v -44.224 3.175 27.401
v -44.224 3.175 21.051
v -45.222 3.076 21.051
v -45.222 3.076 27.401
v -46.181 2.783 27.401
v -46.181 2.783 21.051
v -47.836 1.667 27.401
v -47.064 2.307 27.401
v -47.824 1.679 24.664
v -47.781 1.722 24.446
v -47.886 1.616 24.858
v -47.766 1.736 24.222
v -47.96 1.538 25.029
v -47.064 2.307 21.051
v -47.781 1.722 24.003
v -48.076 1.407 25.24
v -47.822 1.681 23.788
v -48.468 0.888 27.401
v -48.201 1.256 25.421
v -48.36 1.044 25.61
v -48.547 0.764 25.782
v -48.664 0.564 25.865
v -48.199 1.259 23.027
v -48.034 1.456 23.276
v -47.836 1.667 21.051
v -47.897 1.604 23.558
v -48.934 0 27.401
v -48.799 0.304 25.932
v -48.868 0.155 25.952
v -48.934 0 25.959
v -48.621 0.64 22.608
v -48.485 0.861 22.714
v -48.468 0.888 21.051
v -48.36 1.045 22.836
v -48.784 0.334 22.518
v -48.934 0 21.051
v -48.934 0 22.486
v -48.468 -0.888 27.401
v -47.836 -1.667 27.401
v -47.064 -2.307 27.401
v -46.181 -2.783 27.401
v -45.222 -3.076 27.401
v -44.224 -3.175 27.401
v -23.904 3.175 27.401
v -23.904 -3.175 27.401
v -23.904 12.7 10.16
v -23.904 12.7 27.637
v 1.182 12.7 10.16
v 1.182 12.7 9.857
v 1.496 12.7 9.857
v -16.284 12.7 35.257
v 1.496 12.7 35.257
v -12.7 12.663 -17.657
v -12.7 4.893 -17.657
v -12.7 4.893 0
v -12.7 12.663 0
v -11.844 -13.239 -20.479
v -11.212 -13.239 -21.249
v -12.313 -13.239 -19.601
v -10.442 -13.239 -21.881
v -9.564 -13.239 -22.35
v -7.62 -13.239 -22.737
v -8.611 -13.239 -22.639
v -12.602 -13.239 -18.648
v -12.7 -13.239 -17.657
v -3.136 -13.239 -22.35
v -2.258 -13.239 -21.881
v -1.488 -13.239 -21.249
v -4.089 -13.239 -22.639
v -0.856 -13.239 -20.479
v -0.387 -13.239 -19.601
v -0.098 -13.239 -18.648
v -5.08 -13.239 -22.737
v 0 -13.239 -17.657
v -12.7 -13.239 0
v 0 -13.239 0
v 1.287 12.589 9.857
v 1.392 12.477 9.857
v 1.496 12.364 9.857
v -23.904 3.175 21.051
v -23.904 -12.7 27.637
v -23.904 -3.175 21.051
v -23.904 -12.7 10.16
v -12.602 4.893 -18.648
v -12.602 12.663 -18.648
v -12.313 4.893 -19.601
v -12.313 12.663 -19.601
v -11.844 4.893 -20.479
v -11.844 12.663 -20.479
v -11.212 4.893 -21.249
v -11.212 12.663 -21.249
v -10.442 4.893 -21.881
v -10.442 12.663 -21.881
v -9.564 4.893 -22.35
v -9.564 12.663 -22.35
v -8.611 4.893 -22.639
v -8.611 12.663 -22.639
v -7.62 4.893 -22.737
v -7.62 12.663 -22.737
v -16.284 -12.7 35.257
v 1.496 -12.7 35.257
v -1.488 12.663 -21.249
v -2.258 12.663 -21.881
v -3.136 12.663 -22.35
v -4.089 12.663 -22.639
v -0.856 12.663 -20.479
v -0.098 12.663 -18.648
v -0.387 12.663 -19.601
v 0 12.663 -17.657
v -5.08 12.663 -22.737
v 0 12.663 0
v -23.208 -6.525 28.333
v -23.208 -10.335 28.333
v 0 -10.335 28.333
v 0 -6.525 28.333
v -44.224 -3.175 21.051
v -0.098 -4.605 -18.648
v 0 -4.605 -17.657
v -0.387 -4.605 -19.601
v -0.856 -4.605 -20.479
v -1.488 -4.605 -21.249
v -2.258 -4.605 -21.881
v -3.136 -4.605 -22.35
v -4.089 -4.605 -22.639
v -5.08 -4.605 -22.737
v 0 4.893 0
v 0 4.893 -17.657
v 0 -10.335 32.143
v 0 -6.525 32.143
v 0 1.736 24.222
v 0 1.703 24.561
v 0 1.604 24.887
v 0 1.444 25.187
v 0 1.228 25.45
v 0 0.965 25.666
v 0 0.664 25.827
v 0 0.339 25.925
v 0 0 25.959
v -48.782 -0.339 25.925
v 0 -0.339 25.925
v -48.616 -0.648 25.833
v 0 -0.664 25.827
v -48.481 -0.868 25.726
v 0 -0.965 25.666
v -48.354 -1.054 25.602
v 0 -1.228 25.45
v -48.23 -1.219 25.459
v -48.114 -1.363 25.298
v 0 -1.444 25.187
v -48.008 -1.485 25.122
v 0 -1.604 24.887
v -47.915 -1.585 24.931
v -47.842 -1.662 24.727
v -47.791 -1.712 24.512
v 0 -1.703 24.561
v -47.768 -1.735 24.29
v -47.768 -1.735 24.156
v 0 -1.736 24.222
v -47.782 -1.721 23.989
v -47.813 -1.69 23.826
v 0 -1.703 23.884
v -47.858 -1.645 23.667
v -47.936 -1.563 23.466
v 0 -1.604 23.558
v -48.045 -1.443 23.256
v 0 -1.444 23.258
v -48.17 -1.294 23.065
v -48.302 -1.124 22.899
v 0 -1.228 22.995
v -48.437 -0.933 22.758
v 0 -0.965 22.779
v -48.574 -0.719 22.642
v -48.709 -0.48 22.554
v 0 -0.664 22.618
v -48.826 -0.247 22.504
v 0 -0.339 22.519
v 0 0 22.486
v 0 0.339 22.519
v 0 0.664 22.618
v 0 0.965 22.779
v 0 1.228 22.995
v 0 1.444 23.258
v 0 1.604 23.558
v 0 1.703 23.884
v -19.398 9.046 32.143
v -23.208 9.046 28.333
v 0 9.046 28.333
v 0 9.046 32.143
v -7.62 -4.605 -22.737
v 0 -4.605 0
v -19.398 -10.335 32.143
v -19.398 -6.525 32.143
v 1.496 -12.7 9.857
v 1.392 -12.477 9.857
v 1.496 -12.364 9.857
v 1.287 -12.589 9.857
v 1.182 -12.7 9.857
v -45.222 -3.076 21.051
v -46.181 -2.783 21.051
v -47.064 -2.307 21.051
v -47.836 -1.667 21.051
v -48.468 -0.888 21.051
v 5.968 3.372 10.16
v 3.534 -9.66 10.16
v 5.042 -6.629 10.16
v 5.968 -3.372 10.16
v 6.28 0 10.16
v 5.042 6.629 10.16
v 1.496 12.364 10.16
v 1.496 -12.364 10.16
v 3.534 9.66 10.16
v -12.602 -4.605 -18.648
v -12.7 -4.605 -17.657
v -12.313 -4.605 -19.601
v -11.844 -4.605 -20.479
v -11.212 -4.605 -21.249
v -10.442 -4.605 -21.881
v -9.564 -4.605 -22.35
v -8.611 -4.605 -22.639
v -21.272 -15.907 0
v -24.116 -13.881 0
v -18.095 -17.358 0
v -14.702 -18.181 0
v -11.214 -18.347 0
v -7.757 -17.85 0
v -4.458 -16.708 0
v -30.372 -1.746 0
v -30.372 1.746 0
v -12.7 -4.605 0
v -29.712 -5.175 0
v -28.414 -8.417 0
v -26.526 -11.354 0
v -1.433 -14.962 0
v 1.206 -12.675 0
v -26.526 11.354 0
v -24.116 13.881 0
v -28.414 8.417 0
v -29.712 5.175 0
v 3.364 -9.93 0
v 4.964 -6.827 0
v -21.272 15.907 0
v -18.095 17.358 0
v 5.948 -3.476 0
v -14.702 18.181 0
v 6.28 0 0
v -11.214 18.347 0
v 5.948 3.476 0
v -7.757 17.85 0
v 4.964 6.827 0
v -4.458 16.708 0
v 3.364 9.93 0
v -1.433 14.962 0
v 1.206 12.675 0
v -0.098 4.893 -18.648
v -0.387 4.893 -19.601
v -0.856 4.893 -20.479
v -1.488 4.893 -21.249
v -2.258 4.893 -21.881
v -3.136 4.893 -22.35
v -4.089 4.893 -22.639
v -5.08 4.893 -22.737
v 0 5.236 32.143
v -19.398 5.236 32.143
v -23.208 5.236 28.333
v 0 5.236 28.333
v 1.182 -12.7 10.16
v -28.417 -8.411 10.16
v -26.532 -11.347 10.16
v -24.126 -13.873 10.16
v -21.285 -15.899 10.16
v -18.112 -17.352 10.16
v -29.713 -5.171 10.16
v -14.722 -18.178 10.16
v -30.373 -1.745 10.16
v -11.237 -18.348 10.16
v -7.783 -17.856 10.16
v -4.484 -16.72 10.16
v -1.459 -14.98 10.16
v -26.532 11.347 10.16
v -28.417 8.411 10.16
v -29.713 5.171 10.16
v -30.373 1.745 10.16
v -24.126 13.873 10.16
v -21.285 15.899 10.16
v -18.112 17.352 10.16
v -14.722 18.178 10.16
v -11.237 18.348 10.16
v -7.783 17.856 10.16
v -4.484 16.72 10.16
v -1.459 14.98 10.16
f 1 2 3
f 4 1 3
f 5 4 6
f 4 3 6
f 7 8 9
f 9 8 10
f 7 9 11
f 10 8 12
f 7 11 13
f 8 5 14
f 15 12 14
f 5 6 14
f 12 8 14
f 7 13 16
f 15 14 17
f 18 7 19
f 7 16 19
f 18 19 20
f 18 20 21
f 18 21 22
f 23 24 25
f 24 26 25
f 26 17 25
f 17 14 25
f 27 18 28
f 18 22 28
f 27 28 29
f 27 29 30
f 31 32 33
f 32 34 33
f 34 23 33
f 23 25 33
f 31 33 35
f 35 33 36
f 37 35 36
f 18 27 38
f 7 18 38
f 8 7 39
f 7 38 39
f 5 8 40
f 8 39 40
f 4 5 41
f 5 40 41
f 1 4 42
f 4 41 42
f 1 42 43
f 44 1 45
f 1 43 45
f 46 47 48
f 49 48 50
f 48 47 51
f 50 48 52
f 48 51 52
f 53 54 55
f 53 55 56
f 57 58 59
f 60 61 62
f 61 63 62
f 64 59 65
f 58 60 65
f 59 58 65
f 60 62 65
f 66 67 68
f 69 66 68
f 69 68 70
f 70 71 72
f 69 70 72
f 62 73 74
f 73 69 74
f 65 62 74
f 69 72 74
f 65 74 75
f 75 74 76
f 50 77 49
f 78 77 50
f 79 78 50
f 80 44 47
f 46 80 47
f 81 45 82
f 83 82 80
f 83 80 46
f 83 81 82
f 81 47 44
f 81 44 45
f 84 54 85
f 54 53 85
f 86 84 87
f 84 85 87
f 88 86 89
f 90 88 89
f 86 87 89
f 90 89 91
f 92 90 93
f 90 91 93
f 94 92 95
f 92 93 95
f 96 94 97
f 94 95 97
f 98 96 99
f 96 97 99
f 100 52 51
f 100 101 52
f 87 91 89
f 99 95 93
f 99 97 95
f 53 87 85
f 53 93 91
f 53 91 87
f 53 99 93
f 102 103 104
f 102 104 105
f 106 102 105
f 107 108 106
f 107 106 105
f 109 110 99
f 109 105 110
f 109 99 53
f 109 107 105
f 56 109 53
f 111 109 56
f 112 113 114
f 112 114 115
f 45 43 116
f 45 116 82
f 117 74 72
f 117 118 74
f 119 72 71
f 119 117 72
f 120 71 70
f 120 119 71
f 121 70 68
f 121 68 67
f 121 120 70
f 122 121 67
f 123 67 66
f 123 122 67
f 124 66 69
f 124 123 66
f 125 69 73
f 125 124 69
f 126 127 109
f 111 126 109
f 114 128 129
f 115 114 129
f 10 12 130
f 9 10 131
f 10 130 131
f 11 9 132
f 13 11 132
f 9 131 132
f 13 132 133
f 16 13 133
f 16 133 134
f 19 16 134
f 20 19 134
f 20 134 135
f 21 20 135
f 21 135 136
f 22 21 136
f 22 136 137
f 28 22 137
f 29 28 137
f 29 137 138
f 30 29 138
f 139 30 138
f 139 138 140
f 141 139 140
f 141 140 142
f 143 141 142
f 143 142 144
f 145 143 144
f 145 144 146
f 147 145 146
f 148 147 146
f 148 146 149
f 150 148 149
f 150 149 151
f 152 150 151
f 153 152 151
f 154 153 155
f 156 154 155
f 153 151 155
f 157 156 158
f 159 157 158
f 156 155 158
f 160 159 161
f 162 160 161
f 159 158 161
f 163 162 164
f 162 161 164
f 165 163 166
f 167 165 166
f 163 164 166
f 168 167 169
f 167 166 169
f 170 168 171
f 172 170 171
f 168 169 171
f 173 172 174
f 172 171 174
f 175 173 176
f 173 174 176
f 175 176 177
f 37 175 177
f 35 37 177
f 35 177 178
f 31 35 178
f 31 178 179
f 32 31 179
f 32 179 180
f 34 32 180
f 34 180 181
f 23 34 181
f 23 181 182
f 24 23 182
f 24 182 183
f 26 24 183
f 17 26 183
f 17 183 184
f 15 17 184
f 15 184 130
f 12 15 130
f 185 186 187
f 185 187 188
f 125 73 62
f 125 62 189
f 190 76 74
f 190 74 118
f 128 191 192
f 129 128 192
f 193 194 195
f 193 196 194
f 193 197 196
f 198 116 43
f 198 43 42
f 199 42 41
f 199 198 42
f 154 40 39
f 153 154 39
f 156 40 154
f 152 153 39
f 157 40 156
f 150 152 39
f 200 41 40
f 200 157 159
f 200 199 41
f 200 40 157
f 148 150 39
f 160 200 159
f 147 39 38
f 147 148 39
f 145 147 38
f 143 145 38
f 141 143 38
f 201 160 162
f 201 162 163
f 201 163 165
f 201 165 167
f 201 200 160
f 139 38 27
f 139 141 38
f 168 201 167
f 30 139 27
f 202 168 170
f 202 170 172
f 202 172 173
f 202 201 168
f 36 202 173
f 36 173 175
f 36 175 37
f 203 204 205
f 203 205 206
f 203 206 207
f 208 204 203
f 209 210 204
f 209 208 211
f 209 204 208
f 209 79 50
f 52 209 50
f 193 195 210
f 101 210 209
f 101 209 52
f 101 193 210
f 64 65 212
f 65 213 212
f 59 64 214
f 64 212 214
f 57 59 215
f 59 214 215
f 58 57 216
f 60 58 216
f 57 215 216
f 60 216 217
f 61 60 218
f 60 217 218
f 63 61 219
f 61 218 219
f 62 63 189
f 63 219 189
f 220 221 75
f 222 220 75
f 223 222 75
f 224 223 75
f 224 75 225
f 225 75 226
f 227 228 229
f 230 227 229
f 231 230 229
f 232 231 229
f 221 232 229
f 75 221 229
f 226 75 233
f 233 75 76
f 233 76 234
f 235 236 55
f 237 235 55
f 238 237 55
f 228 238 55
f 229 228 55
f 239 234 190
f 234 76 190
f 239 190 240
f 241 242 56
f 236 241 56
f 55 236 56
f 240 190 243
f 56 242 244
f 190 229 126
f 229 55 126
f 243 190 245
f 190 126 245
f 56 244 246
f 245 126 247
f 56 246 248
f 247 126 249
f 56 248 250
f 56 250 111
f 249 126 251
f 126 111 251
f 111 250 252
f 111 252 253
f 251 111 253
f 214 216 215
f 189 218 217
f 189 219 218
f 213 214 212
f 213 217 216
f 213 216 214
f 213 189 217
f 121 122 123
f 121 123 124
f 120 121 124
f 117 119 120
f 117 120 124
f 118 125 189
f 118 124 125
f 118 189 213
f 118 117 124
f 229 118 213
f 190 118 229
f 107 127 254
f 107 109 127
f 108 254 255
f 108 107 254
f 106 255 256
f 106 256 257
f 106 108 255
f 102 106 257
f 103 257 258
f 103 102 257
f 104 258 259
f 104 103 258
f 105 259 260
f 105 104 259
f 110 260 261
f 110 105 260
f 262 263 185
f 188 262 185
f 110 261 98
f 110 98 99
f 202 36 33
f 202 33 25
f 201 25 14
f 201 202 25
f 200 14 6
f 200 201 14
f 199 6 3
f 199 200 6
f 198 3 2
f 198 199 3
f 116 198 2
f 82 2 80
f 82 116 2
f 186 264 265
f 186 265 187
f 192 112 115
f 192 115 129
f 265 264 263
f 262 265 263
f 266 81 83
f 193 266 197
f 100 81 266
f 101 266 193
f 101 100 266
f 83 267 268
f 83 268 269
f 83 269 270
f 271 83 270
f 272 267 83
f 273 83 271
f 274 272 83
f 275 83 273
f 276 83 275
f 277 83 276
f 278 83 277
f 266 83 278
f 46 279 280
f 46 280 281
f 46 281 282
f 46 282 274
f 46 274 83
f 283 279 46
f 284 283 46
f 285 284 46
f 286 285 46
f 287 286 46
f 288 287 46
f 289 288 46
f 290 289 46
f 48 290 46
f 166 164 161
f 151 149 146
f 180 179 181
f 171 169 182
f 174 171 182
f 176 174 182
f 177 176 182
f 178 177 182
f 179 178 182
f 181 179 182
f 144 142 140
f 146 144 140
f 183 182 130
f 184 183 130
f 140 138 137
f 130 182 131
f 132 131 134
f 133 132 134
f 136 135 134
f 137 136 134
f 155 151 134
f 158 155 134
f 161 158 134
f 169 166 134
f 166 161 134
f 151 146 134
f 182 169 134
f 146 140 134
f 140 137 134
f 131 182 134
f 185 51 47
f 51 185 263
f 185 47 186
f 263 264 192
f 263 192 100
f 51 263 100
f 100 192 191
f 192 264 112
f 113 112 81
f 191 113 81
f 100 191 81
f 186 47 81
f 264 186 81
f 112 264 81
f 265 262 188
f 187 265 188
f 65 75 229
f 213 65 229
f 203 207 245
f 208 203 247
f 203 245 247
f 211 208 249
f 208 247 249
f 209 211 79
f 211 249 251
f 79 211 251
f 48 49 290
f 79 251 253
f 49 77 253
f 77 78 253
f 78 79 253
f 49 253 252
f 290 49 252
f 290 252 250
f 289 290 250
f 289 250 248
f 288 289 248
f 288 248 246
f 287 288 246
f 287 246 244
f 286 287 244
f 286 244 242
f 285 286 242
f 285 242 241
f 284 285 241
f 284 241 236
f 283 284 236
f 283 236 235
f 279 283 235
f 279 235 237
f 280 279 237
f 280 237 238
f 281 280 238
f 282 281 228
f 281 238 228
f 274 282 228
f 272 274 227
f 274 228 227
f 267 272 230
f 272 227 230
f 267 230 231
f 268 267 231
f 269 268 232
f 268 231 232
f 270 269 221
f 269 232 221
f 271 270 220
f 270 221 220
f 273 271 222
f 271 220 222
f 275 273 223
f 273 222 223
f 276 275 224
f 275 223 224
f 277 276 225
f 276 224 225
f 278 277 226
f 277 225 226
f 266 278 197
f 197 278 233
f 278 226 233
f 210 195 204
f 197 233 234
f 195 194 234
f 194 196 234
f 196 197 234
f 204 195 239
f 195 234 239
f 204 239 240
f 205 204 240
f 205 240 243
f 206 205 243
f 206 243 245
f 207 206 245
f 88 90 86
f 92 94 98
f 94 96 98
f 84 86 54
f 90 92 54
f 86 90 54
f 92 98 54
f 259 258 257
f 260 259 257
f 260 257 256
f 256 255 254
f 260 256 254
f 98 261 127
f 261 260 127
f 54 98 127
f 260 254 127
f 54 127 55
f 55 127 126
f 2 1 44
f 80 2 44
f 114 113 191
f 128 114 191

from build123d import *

# Parameters (mm, degrees)
F1_DEPTH     = 12.7
F0_W         = 25.4
F0_H         = 6.35
F2_DEPTH     = 3.175
F3_SIZE      = 7.62
F4_R         = 18.3677824361
F5_DEPTH     = 10.16
F6_W         = 8.6341705173
F6_H         = 22.7366536856
F6_W_2       = 7.7707553282
F7_DEPTH     = 12.7
F8_R         = 5.08
F9_R         = 1.736345134
F10_DEPTH    = 177.8
F11_T1_DEPTH = 31.75
F12_W        = 3.81
F12_H        = 3.810003606
F12_H_2      = 3.81
F13_DEPTH    = 25.4


# Not quite as in the source:
# - a fillet or chamfer that OpenCascade refuses, or shapes differently, is made with other operations: its cross-section is extruded or revolved along the edge and cut away or added


with BuildPart() as f1:
    # F0 (on Front) → F1 (new body, symmetric)
    with BuildSketch(Plane.XZ):
        Polygon((1.495771724, 35.256898239), (-23.904228276, 35.256898239), (-23.904228276, 27.4009877652), (-23.904228276, 21.0509877652), (-23.904228276, 9.856898239), (1.495771724, 9.856898239), align=None)
    extrude(amount=F1_DEPTH, both=True)

    # F0 (on Front) → F2 (join, symmetric)
    with BuildSketch(Plane.XZ):
        with Locations((-36.604228276, 24.2259877652)):
            Rectangle(F0_W, F0_H)
    extrude(amount=F2_DEPTH, both=True)

    # F3
    f3_edges = [f1.edges().sort_by_distance(p)[0] for p in [
        (-23.904228, 0, 35.256898),
    ]]
    chamfer(f3_edges, length=F3_SIZE)

    # F4 (on Top) → F5 (join)
    with BuildSketch(Plane.XY):
        with Locations((-12.0878415182, 0)):
            Circle(F4_R)
    extrude(amount=F5_DEPTH)

    # F6 (on Right) → F7 (join)
    with BuildSketch(Plane.YZ):
        with Locations((-8.9219780639, -11.3683268428)):
            Rectangle(F6_W, F6_H)
        with Locations((8.7780752219, -11.3683268428)):
            Rectangle(F6_W_2, F6_H)
    extrude(amount=-F7_DEPTH)

    # F8
    f8_edges = [f1.edges().sort_by_distance(p)[0] for p in [
        (-12.7, 8.778075, -22.736654),
        (-12.7, -8.921978, -22.736654),
        (0, -8.921978, -22.736654),
        (0, 8.778075, -22.736654),
    ]]
    fillet(f8_edges, radius=F8_R)

    # F9 (on Right) → F10 (cut)
    with BuildSketch(Plane.YZ):
        with Locations((0, 24.2223944515)):
            Circle(F9_R)
    extrude(amount=-F10_DEPTH, mode=Mode.SUBTRACT)

    # F11: fillet of radius 5.08 on 2 edges, made by hand

    # F11_s2 → F11_t1 (cut)
    with BuildSketch(Plane.XY.offset(8.3509877652)):
        with BuildLine():
            ThreePointArc((-44.224228276, 3.175), (-47.8163307244, 1.6871024484), (-49.304228276, -1.905))
            Line((-49.304228276, -1.905), (-49.304228276, 3.175))
            Line((-49.304228276, 3.175), (-44.224228276, 3.175))
        make_face()
        with BuildLine():
            ThreePointArc((-44.224228276, -3.175), (-47.8163307244, -1.6871024484), (-49.304228276, 1.905))
            Line((-49.304228276, 1.905), (-49.304228276, -3.175))
            Line((-49.304228276, -3.175), (-44.224228276, -3.175))
        make_face()
    extrude(amount=F11_T1_DEPTH, mode=Mode.SUBTRACT)

    # F12 (on Right) → F13 (cut)
    with BuildSketch(Plane.YZ):
        with Locations((7.1409824217, 30.2377566695)):
            Rectangle(F12_W, F12_H)
        with Locations((-8.4303260025, 30.2377548665)):
            Rectangle(F12_W, F12_H_2)
    extrude(amount=-F13_DEPTH, mode=Mode.SUBTRACT)


solid = f1.part
